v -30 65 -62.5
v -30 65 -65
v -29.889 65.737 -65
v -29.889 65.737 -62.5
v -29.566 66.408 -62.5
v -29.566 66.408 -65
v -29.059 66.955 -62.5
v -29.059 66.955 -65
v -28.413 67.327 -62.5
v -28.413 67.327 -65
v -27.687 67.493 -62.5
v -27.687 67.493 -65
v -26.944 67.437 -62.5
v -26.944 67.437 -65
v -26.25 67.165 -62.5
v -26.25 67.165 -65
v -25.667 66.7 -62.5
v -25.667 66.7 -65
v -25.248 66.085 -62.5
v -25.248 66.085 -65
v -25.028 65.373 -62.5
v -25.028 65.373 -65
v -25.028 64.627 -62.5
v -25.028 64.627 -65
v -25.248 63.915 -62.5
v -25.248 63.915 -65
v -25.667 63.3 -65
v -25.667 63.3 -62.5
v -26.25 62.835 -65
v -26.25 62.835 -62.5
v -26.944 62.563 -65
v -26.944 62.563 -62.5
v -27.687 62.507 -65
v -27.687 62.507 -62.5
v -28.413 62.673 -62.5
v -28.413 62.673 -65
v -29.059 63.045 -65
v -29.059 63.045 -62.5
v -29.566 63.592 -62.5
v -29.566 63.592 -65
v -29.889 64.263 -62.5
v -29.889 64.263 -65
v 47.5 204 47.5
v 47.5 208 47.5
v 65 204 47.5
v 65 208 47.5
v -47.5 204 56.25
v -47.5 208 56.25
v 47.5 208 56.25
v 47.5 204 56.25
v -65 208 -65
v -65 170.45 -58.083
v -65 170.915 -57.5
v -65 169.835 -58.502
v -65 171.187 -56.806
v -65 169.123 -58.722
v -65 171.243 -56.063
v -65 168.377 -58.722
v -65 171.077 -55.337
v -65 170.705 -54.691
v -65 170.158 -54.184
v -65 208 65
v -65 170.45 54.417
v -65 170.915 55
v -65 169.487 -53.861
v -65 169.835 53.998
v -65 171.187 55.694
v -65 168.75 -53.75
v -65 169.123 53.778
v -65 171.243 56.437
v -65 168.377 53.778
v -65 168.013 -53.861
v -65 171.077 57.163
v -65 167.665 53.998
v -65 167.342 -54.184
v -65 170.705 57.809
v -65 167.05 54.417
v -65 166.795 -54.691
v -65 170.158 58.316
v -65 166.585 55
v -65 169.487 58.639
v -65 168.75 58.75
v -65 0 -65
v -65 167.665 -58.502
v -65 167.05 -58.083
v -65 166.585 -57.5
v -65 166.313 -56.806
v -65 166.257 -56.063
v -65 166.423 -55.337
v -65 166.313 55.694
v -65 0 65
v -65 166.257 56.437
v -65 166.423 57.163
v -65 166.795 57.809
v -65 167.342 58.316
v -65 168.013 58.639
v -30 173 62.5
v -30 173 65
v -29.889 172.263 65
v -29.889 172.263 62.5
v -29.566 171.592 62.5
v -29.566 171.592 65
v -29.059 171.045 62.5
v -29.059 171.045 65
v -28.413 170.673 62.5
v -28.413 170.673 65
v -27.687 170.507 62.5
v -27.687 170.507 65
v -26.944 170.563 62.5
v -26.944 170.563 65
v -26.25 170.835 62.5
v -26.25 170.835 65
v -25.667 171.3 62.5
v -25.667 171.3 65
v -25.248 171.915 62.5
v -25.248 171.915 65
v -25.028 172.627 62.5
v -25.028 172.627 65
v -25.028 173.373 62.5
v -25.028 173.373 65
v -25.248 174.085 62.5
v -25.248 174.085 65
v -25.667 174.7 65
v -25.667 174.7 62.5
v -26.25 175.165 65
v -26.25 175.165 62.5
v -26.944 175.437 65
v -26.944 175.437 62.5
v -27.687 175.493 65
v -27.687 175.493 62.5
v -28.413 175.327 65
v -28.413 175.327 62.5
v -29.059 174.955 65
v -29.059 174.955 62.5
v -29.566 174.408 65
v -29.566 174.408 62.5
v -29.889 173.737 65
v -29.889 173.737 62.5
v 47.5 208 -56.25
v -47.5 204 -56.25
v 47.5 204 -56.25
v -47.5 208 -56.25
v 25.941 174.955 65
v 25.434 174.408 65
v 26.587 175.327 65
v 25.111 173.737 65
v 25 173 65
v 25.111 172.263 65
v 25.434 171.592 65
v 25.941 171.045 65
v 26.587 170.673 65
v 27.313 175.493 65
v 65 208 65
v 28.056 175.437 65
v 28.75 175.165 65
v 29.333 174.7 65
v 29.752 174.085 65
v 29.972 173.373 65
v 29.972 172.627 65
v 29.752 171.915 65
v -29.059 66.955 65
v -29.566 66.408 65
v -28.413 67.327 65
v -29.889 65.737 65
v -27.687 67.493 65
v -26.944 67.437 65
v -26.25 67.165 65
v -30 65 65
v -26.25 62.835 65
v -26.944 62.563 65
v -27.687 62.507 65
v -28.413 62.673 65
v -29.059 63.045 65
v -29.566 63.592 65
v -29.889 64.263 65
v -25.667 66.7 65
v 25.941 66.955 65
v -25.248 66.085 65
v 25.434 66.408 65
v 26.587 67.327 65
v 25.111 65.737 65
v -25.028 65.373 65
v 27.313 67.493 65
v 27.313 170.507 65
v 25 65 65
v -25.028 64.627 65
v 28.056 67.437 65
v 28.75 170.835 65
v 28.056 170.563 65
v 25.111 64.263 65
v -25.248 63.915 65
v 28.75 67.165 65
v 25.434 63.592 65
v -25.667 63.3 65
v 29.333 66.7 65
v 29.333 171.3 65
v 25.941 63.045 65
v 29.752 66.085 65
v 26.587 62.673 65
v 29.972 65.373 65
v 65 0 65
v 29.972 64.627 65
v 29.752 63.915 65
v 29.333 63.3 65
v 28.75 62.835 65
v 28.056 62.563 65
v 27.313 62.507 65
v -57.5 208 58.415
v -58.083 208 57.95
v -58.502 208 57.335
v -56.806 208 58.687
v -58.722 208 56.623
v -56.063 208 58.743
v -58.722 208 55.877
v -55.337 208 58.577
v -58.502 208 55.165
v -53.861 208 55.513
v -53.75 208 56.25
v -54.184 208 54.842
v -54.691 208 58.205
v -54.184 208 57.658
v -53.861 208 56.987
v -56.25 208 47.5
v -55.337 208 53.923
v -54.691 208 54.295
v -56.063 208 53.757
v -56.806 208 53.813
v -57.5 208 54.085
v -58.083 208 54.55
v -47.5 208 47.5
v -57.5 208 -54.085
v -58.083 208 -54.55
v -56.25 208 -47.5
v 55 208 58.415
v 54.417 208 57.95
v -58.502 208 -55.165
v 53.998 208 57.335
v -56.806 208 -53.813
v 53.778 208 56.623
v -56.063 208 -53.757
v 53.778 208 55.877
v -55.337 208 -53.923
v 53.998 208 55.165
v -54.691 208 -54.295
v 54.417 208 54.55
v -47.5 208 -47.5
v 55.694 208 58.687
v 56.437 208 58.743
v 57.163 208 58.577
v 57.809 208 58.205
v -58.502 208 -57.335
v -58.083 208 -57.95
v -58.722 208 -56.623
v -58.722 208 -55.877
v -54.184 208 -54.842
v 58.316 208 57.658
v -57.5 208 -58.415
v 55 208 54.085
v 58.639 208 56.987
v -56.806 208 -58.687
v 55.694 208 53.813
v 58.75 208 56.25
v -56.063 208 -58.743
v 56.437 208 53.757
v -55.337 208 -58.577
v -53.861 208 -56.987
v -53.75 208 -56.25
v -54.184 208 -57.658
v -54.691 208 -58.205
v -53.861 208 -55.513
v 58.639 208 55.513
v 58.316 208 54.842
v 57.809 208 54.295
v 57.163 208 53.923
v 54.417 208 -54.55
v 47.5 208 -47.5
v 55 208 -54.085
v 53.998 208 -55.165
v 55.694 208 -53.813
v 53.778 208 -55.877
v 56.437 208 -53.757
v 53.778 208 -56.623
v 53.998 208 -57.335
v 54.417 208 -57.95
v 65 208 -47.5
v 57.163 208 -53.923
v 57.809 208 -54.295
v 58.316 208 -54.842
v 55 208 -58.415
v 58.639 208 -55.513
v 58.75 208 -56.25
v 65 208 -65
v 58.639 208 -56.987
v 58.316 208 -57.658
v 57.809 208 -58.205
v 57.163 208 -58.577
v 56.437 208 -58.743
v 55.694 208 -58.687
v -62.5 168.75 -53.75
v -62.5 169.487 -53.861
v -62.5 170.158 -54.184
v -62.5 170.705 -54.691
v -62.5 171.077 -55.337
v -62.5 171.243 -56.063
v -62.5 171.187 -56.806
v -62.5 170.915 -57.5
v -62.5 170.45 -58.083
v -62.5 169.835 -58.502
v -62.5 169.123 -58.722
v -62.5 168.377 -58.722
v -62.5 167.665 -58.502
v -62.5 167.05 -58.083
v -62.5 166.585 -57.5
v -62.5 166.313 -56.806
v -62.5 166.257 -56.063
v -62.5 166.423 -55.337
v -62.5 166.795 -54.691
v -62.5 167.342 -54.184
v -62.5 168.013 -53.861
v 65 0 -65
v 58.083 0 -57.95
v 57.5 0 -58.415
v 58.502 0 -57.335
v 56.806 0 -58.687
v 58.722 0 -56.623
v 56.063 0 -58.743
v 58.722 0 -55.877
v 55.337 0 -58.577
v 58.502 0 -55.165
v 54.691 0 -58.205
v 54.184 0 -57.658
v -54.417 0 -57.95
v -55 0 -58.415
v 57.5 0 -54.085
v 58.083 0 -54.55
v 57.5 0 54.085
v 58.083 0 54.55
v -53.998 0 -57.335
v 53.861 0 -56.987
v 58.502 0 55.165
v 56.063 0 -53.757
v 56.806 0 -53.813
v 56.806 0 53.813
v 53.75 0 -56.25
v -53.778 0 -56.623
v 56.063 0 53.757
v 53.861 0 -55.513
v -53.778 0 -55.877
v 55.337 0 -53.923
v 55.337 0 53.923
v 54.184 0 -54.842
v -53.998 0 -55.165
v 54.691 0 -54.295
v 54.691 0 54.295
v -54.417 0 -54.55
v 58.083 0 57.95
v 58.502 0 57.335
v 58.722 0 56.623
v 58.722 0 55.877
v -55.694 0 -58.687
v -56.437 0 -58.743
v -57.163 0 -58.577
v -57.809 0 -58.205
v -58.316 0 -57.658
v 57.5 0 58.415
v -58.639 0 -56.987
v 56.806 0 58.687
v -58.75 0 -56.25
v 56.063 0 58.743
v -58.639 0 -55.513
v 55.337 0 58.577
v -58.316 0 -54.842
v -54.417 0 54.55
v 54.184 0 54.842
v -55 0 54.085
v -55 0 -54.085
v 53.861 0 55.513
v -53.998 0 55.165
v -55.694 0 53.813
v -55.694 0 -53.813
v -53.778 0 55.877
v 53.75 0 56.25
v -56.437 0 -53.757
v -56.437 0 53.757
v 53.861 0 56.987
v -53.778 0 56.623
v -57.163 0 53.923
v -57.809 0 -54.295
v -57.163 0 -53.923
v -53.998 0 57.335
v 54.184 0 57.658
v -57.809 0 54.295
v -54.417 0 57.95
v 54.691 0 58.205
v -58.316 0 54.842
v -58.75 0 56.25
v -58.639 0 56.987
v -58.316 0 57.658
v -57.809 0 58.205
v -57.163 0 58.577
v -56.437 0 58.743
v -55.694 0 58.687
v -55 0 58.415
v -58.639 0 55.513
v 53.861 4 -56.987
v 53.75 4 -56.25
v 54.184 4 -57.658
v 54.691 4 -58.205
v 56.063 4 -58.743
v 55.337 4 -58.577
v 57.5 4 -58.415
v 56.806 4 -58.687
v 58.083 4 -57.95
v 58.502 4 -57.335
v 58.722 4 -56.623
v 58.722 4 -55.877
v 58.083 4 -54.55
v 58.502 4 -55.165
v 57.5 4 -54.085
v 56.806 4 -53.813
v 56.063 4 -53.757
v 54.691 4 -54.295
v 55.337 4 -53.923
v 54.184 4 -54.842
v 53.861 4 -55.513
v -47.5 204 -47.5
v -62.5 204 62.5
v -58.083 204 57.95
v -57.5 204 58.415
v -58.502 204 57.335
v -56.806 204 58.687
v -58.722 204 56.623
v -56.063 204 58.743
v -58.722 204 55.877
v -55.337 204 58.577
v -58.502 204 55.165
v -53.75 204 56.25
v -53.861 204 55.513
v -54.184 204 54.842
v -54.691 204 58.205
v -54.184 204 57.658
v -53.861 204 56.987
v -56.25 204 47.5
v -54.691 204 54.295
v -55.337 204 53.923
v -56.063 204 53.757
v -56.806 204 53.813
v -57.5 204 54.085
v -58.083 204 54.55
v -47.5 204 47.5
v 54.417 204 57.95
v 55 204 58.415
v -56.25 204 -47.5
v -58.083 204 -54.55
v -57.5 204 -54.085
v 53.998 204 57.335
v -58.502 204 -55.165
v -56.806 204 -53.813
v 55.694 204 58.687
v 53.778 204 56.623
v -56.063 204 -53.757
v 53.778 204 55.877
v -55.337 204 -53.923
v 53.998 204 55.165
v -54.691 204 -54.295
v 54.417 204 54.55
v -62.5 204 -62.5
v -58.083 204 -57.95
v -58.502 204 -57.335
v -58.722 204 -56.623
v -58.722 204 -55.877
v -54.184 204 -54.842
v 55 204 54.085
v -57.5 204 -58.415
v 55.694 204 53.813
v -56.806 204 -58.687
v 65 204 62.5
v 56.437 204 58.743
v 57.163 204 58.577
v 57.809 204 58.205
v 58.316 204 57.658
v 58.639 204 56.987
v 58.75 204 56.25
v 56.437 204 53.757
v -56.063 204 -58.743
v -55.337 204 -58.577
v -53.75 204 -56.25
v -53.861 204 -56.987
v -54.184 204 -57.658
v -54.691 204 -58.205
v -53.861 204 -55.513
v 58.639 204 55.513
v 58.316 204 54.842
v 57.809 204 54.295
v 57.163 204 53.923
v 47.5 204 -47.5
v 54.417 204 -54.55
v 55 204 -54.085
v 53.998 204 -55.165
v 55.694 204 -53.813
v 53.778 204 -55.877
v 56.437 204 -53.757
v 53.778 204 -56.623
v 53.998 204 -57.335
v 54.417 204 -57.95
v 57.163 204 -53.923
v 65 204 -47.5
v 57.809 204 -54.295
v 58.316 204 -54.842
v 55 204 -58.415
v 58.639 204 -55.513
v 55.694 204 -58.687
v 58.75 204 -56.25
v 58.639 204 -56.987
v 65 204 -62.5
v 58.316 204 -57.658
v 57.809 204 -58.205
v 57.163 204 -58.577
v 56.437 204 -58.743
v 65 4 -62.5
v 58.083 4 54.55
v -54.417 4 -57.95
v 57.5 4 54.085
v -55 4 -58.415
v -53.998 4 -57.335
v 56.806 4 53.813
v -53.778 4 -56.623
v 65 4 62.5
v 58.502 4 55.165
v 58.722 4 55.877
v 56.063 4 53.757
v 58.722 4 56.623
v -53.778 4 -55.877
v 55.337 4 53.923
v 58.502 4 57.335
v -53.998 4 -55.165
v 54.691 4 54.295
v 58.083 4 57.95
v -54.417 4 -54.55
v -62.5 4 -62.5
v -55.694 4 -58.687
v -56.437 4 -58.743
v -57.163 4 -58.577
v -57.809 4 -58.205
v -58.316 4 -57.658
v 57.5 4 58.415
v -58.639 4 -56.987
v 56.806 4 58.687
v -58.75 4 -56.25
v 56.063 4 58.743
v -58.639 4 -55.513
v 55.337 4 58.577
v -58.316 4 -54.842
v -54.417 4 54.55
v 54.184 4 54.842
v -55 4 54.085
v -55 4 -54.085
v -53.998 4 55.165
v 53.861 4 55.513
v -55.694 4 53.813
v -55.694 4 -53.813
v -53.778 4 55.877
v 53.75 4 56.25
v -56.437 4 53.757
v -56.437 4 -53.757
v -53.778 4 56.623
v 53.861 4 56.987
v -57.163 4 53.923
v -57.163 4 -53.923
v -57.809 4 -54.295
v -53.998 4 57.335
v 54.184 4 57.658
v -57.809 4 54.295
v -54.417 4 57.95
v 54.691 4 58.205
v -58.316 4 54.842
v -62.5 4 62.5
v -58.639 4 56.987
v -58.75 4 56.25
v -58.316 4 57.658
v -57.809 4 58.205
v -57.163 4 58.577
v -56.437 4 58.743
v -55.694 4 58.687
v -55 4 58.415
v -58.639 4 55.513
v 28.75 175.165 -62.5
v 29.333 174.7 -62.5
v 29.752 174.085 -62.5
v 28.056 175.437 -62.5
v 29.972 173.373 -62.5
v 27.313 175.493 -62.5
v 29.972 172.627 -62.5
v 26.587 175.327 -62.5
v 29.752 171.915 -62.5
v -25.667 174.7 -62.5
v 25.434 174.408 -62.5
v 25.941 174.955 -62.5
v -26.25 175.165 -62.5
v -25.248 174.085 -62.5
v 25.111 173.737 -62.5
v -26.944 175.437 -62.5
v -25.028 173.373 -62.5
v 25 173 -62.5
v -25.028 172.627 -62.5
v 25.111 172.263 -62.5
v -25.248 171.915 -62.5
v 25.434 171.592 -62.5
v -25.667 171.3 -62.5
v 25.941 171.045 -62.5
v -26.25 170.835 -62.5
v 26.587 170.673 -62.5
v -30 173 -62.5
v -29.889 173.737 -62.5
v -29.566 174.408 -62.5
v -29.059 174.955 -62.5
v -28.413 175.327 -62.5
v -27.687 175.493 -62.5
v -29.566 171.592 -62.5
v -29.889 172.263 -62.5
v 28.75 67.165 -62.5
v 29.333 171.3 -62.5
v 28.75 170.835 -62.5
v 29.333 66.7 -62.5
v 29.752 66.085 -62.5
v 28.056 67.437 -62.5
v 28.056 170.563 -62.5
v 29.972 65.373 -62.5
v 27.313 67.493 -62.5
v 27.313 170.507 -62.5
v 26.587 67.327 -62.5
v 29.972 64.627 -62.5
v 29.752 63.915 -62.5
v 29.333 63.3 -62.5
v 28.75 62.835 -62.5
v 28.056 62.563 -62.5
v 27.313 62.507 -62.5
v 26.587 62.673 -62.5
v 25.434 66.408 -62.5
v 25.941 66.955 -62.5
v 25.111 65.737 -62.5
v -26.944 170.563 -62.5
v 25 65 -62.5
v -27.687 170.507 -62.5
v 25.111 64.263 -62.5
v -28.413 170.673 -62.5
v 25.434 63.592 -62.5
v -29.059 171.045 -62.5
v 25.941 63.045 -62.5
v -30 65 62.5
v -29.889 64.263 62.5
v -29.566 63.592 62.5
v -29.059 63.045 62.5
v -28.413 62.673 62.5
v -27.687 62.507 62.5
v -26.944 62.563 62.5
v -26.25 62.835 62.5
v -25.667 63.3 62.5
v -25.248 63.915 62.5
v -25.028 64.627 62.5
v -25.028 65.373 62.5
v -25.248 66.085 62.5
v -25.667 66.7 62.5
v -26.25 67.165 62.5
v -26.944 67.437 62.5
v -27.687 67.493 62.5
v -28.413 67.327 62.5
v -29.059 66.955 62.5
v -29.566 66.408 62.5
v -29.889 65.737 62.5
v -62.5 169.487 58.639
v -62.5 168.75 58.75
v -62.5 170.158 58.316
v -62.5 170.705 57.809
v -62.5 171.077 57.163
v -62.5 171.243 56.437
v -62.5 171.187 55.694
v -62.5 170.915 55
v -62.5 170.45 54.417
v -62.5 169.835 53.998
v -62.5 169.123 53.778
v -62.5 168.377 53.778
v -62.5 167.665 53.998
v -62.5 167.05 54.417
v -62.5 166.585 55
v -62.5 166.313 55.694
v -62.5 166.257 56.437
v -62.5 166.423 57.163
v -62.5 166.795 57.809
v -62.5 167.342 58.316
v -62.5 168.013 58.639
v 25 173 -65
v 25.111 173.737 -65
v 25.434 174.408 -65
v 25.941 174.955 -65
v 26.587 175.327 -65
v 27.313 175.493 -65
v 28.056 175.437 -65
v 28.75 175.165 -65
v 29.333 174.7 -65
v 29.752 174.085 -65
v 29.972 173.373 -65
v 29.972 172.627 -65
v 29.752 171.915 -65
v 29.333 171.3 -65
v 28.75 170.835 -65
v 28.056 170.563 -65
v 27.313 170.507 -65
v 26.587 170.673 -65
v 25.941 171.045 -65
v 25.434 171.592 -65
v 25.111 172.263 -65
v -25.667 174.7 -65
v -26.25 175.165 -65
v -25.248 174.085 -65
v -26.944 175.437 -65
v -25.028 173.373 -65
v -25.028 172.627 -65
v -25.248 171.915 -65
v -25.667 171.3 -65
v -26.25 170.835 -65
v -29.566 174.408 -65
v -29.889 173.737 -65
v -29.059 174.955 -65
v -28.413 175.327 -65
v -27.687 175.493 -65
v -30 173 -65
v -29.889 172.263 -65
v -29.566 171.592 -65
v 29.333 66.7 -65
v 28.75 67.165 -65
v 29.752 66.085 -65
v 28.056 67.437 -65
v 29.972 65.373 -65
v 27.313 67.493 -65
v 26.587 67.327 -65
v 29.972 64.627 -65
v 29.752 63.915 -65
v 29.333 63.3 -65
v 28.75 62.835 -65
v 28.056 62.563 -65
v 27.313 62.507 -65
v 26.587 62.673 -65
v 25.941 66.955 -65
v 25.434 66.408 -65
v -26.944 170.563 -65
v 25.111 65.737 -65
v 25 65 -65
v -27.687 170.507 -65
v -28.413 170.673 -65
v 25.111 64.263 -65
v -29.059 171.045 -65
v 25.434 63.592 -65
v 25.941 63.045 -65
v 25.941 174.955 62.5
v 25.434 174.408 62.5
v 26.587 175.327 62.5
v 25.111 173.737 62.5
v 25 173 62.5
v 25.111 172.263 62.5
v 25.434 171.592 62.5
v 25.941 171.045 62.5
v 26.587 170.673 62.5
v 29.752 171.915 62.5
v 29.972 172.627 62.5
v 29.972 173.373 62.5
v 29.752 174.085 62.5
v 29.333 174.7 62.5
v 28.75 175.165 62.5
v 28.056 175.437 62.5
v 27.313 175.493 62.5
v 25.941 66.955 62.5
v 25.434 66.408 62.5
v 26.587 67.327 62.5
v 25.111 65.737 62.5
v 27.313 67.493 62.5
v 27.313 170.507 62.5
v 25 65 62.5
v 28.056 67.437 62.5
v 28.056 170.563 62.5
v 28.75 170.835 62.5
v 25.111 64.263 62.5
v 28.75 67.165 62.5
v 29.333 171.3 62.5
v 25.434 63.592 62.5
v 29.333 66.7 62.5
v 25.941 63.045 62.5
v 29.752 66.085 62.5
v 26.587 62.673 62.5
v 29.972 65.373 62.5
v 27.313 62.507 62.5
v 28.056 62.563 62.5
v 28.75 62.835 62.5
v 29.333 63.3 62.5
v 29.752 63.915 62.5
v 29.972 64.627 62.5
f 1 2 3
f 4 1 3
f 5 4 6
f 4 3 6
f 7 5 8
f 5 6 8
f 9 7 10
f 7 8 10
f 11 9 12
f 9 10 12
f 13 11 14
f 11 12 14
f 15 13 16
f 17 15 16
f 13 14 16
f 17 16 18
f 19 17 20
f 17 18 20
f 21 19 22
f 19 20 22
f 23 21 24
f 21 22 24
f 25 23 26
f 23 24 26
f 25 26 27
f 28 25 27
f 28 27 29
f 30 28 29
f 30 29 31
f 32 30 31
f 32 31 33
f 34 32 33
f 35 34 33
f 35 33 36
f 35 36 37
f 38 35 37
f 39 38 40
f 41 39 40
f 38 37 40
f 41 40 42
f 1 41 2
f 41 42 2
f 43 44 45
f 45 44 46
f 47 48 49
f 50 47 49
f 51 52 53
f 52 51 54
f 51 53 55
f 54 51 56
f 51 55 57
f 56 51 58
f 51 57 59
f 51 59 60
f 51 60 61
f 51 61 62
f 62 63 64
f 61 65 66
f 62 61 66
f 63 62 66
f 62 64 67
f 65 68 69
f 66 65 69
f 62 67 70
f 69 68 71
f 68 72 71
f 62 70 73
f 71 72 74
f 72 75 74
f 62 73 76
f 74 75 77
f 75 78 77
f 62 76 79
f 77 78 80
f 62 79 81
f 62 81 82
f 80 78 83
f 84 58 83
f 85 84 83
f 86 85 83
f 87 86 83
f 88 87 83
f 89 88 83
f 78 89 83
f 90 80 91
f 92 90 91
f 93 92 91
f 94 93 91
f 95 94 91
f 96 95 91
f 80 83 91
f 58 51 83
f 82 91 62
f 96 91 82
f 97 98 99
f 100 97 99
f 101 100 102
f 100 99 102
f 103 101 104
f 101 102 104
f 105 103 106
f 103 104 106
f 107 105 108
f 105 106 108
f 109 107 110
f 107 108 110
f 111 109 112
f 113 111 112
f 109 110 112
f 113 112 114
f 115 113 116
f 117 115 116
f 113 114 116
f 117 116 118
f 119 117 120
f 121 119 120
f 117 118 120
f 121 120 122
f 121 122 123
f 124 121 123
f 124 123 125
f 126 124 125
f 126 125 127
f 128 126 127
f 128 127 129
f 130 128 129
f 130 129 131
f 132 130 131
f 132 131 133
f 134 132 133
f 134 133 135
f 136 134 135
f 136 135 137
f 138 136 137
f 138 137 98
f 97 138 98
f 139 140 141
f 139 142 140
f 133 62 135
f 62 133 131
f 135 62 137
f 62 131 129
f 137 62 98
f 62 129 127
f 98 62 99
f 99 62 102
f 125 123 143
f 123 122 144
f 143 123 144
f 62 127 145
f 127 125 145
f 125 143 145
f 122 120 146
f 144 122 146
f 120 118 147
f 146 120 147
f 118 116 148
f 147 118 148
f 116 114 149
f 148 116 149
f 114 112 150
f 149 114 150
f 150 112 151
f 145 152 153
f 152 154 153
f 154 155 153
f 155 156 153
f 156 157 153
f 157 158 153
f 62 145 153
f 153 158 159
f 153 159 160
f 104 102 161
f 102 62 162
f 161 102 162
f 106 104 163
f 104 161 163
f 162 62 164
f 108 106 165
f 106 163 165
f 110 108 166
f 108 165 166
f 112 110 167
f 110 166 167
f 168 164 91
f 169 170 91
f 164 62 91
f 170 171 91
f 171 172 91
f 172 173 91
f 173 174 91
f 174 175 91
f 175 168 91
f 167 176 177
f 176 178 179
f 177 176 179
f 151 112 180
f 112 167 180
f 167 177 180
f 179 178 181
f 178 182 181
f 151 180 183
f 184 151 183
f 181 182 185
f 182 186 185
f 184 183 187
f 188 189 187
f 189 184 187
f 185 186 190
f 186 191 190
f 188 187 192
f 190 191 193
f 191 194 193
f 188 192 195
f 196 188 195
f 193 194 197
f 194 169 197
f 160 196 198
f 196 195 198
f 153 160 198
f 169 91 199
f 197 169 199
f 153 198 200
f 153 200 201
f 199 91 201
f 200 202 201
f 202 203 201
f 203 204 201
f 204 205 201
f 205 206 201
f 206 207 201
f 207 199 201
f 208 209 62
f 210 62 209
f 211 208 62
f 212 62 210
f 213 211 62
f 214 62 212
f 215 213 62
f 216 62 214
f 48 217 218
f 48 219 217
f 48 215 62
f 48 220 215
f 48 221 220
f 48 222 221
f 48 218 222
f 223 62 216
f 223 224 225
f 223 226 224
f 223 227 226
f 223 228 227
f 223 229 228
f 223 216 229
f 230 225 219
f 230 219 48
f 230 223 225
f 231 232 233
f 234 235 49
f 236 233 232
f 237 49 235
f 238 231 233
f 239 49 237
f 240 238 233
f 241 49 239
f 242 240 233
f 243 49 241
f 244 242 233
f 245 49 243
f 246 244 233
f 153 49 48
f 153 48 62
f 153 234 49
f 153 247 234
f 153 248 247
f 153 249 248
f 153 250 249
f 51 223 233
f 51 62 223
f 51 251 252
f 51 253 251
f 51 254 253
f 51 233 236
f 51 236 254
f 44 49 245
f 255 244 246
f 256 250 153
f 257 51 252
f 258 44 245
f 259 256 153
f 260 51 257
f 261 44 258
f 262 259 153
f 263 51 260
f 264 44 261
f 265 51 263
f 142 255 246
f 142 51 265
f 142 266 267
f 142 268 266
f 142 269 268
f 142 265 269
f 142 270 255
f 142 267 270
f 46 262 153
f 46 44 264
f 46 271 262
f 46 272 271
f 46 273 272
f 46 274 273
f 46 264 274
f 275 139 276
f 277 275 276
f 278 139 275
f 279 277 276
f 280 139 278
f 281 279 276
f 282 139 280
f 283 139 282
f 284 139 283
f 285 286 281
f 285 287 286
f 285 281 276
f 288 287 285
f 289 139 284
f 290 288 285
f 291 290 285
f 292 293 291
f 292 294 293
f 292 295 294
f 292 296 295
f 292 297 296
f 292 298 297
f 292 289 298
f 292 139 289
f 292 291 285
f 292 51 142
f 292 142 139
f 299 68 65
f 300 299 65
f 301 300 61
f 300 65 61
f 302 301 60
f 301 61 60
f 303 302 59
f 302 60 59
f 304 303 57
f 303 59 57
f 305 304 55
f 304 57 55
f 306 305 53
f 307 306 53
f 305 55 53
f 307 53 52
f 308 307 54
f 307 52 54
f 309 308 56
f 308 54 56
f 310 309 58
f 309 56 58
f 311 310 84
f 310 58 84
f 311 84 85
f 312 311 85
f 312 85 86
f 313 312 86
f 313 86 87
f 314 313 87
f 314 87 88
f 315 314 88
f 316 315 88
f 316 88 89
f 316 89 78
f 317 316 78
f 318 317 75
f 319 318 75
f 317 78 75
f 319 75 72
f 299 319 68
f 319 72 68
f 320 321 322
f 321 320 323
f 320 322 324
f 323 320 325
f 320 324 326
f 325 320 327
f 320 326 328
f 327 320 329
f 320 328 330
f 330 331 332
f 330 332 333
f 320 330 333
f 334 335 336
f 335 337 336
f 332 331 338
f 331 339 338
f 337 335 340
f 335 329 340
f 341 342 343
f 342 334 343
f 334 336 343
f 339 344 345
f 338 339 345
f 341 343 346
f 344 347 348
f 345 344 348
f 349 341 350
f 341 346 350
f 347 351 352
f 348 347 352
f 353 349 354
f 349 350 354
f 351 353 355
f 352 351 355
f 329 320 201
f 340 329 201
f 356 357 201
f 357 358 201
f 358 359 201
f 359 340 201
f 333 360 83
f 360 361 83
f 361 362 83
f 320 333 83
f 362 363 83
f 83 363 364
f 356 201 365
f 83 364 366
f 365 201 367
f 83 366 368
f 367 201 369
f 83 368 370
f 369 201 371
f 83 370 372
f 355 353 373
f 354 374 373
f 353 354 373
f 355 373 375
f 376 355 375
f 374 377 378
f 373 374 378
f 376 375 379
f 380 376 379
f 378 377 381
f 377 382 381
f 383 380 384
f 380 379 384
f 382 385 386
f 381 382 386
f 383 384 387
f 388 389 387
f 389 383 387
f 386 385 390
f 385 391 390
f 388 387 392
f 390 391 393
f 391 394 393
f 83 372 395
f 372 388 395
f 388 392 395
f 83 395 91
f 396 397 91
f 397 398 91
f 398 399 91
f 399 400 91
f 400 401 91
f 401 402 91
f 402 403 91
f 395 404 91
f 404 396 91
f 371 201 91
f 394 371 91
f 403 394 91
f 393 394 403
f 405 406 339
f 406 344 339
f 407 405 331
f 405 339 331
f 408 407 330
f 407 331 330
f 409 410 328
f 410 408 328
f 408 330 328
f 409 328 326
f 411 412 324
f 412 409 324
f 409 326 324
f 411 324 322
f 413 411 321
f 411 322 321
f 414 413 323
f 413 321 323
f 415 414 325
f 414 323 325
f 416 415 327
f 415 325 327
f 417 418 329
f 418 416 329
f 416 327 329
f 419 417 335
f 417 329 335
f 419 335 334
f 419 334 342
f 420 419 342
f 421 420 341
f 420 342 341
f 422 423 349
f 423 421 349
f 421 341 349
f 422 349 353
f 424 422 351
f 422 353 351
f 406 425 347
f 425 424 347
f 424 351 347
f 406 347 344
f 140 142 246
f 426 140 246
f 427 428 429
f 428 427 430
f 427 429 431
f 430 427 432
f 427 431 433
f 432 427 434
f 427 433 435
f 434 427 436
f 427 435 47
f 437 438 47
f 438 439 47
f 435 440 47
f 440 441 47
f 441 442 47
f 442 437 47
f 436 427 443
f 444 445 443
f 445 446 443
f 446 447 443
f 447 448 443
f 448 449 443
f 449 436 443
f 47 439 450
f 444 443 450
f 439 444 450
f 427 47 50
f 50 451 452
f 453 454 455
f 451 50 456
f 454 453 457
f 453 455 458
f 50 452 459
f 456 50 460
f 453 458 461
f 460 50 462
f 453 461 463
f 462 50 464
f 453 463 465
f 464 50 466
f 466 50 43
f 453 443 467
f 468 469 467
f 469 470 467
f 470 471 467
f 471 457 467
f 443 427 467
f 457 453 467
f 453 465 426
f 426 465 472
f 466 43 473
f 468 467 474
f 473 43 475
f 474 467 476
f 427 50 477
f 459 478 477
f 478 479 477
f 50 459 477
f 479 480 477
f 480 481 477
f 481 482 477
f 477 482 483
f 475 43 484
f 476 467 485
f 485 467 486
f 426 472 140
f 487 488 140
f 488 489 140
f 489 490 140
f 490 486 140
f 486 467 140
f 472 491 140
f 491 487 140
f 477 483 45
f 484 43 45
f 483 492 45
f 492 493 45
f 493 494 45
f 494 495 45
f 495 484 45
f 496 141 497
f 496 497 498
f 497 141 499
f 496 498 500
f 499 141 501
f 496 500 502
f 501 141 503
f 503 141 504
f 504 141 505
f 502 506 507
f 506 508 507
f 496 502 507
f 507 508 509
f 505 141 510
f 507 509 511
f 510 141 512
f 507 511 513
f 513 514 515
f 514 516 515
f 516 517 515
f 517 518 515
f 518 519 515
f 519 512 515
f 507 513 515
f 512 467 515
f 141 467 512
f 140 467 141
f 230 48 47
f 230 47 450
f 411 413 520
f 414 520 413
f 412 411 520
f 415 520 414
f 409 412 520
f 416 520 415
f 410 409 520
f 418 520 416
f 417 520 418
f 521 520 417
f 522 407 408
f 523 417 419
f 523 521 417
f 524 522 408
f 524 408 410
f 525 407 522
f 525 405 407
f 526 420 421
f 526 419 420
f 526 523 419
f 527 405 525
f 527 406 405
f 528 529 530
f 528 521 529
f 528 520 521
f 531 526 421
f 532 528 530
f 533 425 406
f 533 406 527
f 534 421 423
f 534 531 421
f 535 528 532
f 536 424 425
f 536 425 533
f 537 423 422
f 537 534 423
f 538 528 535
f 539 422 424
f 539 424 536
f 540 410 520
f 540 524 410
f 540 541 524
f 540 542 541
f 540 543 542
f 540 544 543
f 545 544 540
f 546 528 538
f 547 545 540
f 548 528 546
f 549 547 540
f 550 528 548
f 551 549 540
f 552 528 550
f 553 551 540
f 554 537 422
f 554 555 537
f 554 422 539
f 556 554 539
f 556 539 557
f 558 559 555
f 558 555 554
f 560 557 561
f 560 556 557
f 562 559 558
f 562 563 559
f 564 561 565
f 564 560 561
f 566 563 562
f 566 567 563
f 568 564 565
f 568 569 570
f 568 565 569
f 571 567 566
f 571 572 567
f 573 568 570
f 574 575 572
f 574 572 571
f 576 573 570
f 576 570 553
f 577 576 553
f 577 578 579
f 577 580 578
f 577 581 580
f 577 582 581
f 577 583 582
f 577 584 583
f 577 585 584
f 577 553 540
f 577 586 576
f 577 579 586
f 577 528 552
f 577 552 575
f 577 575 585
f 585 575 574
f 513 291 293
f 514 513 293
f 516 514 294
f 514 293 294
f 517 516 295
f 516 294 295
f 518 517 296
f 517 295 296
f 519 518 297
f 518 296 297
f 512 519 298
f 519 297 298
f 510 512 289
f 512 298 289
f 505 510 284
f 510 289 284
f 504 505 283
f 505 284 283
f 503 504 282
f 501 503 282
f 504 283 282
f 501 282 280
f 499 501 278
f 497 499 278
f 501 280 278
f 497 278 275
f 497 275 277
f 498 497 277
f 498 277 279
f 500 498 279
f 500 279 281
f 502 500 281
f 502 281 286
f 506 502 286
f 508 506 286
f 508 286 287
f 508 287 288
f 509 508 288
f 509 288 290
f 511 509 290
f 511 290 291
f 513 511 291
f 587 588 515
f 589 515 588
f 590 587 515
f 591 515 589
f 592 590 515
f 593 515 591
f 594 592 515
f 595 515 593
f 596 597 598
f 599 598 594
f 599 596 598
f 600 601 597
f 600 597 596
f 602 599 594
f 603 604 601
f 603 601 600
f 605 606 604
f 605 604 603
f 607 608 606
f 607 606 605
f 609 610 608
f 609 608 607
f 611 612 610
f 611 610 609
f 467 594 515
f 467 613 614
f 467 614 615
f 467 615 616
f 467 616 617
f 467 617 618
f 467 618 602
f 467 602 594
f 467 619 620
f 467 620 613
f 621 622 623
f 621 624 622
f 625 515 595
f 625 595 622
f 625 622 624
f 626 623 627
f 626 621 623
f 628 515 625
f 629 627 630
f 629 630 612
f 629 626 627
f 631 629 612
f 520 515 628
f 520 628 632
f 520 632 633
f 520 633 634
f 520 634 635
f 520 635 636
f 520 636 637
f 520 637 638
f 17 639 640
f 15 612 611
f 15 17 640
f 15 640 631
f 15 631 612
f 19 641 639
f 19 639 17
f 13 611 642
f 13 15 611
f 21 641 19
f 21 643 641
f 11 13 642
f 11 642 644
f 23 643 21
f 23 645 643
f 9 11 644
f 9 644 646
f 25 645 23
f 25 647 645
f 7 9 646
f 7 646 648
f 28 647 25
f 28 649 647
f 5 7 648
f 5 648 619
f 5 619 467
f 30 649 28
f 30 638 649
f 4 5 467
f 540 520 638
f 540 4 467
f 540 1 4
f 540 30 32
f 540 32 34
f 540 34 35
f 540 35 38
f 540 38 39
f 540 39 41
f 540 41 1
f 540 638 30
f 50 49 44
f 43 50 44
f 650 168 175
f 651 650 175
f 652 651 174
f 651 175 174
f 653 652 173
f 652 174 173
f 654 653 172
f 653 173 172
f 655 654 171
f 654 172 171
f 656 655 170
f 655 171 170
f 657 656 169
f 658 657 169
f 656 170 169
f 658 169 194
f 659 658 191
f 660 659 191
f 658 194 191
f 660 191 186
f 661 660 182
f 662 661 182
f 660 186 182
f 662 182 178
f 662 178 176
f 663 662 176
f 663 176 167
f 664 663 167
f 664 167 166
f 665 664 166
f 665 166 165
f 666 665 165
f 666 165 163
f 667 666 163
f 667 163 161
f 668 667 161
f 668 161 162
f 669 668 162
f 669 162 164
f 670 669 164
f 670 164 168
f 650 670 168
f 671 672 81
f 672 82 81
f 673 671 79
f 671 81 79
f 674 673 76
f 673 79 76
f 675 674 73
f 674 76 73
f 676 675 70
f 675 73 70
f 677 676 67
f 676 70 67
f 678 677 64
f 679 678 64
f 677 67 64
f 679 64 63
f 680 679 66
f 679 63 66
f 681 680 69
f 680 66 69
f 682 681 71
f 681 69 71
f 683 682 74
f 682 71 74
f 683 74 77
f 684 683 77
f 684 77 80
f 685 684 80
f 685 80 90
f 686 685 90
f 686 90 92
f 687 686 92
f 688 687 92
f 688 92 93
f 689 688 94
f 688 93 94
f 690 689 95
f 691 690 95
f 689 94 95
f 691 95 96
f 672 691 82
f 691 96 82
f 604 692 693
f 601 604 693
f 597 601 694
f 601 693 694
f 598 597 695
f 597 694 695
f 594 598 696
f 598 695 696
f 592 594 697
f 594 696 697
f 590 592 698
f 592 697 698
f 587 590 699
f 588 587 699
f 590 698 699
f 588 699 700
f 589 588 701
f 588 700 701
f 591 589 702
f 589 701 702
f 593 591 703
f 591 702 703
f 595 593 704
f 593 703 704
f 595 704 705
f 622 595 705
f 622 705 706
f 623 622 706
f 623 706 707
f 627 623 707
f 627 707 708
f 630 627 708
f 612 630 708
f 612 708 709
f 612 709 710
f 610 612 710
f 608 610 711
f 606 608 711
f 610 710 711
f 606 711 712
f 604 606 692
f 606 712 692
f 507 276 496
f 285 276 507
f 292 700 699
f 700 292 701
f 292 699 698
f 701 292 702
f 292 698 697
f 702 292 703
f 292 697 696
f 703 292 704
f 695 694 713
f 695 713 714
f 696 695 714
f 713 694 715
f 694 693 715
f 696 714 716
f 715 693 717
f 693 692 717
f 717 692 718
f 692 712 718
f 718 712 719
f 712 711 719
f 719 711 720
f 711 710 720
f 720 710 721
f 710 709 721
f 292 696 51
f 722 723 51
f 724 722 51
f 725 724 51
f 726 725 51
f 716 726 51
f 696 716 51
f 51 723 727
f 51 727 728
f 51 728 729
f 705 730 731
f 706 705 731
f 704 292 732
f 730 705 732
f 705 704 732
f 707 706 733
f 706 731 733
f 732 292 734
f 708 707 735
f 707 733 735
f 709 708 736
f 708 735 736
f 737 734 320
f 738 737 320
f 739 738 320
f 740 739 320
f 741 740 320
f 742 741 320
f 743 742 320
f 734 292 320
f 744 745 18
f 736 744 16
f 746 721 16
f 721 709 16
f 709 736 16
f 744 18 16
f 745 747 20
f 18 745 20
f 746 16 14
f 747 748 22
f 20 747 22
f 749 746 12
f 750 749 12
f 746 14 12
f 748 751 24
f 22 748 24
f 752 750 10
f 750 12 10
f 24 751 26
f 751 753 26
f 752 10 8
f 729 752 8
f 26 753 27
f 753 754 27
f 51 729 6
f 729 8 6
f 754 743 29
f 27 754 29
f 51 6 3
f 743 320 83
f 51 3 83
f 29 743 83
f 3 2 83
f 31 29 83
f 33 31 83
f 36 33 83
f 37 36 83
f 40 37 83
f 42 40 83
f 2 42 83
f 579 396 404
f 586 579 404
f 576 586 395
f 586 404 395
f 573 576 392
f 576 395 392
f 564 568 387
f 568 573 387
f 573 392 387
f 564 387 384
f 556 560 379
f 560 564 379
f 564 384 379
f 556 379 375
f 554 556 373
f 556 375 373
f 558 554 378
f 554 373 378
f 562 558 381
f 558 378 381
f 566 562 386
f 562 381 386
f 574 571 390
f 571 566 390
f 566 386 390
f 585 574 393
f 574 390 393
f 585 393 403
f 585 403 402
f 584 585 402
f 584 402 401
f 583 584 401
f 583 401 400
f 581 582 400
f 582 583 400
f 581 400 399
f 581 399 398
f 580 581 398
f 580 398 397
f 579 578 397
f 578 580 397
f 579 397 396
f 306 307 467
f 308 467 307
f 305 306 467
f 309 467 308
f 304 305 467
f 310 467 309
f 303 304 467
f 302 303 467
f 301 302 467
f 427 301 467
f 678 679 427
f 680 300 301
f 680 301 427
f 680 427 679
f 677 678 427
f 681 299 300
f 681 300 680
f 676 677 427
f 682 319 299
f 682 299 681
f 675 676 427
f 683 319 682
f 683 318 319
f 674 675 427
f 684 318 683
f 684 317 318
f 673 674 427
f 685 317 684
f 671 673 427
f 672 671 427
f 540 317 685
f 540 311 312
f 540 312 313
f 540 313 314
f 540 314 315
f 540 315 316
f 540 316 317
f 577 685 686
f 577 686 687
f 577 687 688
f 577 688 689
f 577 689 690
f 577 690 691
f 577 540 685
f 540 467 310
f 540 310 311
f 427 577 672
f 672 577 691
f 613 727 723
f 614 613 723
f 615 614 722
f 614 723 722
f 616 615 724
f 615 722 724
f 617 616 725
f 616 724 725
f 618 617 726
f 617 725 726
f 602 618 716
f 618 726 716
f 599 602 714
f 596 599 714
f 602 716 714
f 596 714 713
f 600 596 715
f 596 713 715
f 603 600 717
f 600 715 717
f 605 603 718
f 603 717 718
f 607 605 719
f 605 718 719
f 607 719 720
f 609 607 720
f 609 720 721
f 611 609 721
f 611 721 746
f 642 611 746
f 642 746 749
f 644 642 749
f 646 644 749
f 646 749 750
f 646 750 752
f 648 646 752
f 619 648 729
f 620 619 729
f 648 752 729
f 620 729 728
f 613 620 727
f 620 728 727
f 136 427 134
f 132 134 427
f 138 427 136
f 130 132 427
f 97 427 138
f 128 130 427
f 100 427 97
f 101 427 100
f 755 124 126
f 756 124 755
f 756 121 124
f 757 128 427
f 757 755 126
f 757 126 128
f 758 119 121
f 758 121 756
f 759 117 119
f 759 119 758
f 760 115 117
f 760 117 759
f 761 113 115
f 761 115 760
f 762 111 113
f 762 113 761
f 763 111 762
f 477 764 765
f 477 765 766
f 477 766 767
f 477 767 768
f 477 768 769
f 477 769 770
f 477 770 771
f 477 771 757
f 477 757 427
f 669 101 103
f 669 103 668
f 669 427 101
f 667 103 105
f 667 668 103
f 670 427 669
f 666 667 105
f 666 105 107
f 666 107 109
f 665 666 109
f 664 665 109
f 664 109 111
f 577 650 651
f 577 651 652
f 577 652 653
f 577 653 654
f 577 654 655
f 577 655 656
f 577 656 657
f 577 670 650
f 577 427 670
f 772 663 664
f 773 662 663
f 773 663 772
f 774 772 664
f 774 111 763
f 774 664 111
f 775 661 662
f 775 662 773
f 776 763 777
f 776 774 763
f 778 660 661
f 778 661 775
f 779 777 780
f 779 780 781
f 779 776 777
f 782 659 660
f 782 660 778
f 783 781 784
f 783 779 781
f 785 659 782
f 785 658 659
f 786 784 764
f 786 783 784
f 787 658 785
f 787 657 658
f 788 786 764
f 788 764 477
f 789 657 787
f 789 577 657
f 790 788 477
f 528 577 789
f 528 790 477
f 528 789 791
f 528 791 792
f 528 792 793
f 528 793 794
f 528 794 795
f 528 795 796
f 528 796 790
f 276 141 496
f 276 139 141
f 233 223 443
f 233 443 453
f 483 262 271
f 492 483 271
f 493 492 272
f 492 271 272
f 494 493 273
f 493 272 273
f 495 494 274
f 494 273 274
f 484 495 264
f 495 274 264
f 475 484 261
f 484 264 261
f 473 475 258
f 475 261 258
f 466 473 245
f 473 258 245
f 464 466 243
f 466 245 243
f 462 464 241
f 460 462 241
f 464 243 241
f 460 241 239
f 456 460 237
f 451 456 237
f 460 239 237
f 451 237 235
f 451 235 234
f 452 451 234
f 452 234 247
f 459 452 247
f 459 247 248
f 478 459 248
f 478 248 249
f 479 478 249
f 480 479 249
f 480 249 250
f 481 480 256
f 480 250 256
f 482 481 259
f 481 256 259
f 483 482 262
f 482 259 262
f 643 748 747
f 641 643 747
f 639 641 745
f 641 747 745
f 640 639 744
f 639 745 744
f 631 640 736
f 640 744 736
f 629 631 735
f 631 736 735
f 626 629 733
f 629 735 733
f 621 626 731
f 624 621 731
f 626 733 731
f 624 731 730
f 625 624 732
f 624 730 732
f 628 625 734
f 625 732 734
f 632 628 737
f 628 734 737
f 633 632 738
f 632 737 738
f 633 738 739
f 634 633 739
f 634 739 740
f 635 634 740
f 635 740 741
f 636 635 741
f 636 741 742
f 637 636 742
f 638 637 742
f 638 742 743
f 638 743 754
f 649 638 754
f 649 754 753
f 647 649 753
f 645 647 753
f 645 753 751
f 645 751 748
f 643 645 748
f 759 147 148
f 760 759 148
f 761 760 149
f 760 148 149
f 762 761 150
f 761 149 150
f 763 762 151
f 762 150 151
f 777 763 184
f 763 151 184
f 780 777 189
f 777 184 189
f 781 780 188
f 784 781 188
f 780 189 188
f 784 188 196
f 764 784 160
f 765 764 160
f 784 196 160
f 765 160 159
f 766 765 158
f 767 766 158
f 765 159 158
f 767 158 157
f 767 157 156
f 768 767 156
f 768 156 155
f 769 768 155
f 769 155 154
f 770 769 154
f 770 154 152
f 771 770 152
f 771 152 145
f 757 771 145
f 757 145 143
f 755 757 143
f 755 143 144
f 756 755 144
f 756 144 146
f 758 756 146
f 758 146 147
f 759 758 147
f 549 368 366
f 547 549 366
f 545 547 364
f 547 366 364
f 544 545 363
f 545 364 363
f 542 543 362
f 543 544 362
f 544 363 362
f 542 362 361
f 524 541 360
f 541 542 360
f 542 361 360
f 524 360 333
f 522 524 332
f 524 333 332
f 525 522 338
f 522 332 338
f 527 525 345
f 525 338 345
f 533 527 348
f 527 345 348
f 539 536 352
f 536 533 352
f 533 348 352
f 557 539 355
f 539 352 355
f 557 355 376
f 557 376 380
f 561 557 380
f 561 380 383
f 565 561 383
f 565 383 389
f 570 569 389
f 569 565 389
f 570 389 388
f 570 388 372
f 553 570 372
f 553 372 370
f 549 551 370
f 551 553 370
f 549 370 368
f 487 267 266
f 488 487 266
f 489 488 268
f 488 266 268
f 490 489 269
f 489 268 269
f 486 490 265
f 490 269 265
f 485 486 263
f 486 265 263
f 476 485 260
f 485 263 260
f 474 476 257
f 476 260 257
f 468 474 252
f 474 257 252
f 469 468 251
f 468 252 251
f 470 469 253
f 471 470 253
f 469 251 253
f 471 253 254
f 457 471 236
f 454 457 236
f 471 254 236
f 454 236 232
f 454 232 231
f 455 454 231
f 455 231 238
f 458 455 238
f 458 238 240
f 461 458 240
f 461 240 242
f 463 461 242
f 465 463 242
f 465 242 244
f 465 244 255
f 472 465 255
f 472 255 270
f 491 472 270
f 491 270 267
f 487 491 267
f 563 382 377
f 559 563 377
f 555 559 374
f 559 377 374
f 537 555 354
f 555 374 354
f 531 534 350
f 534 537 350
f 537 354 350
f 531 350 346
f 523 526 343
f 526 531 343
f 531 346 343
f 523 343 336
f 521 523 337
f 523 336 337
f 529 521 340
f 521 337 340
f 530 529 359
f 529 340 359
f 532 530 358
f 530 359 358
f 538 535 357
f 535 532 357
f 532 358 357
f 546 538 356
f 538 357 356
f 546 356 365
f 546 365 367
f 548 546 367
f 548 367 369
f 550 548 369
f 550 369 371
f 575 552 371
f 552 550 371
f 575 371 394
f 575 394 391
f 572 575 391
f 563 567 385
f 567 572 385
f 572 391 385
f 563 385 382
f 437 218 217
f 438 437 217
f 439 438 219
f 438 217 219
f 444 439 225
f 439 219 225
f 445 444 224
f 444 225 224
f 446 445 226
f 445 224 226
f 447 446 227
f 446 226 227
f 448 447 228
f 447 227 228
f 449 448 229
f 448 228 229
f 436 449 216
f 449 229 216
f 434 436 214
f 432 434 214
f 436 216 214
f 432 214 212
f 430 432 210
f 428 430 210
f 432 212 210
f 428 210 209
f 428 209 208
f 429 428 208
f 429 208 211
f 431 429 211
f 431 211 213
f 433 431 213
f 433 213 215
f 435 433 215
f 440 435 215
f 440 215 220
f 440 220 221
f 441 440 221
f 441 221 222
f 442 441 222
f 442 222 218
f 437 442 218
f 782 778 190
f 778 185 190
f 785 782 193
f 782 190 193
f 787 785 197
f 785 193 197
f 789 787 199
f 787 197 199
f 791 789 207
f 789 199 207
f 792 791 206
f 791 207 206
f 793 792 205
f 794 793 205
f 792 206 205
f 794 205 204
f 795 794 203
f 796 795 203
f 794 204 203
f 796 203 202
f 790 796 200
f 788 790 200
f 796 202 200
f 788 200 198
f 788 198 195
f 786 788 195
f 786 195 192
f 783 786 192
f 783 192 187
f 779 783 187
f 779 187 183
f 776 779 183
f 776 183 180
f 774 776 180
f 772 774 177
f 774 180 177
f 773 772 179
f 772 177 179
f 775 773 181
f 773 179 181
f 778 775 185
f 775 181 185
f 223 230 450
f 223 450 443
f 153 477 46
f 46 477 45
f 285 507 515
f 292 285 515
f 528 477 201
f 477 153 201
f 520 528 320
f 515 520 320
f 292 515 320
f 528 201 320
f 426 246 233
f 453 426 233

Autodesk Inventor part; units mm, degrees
ref_plane "YZ Plane" through (0, 0, 0) normal (1, 0, 0) x (0, 1, 0)
ref_plane "XZ Plane" through (0, 0, 0) normal (0, 1, 0) x (-1, 0, 0)
ref_plane "XY Plane" through (0, 0, 0) normal (0, 0, 1) x (1, 0, 0)
sketch "Sketch1" plane through (0, 0, 0) normal (0, 1, 0) x (-1, 0, 0)
  line L0 (65, 65) -> (-65, 65)
  line L1 (-65, 65) -> (-65, -65)
  line L2 (-65, -65) -> (65, -65)
  line L3 (65, -65) -> (65, 65)
  line L4 (65, 65) -> (-65, -65) construction
  line L5 (-65, 65) -> (65, -65) construction
  circle A0 centre (-56.25, 56.25) radius 2.5
  line L6 (0, 15.2849) -> (0, -21.0051)
  line L7 (0, -21.0051) -> (-20.003, 0)
  line L8 (-20.003, 0) -> (15.941, 0)
  circle A1 centre (56.25, 56.25) radius 2.5
  circle A2 centre (-56.25, -56.25) radius 2.5
  circle A3 centre (56.25, -56.25) radius 2.5
  point P0 (0, 0)
  point P1 (0, 0)
  dimension "d0" = 130
  dimension "d1" = 130
  dimension "d2" = 5
  dimension "d3" = 8.75
extrude "Extrusion1" add sketch "Sketch1" along normal blind 4 contours L3 L2 L1 L0 | L6 L7 L8
sketch "Sketch2" plane through (0, 4, 0) normal (0, 1, 0) x (1, 0, 0)
  line L0 (-62.5, -62.5) -> (62.5, -62.5)
  line L1 (62.5, -62.5) -> (62.5, 62.5)
  line L2 (62.5, 62.5) -> (-62.5, 62.5)
  line L3 (-62.5, 62.5) -> (-62.5, -62.5)
  line L4 (-62.5, -62.5) -> (62.5, 62.5) construction
  line L5 (62.5, -62.5) -> (-62.5, 62.5) construction
  line L6 (-65, 65) -> (-65, -65) projected
  line L7 (65, 65) -> (-65, 65) projected
  line L8 (-65, -65) -> (65, -65)
  line L9 (65, -65) -> (65, 65)
  line L10 (65, 65) -> (-65, 65)
  line L11 (-65, 65) -> (-65, -65)
  line L12 (-65, -65) -> (65, 65) construction
  line L13 (65, -65) -> (-65, 65) construction
  line L14 (62.5, -62.5) -> (65, -62.5)
  line L15 (62.5, 62.5) -> (65, 62.5)
  point P0 (0, 0)
  dimension "d6" = 2.5
  dimension "d7" = 2.5
extrude "Extrusion2" add sketch "Sketch2" along normal blind 204 contours L0 L14 L9 L8 L6 L7 L15 L2 L3
sketch "Sketch3" plane through (0, 208, 0) normal (0, 1, 0) x (1, 0, 0)
  line L0 (-65, 65) -> (-65, -65) projected
  line L1 (-65, -65) -> (-47.5, -65)
  line L2 (-47.5, -65) -> (-47.5, -47.5)
  line L3 (-47.5, -47.5) -> (-65, -47.5)
  line L4 (-65, -47.5) -> (-65, -65)
  line L5 (-65, 65) -> (-47.5, 65)
  line L6 (-47.5, 65) -> (-47.5, 47.5)
  line L7 (-47.5, 47.5) -> (-65, 47.5)
  line L8 (-65, 47.5) -> (-65, 65)
  line L9 (-65, -65) -> (65, -65) projected
  line L10 (65, -65) -> (47.5, -65)
  line L11 (47.5, -65) -> (47.5, -47.5)
  line L12 (47.5, -47.5) -> (65, -47.5)
  line L13 (65, -47.5) -> (65, -65)
  line L14 (65, 65) -> (-65, 65) projected
  line L15 (65, 65) -> (47.5, 65)
  line L16 (47.5, 65) -> (47.5, 47.5)
  line L17 (47.5, 47.5) -> (65, 47.5)
  line L18 (65, 47.5) -> (65, 65)
  circle A0 centre (56.25, -56.25) radius 2.5
  circle A1 centre (56.25, 56.25) radius 2.5 projected
  circle A2 centre (56.25, 56.25) radius 2.5
  circle A3 centre (-56.25, 56.25) radius 2.5
  circle A4 centre (-56.25, -56.25) radius 2.5 projected
  circle A5 centre (-56.25, -56.25) radius 2.5
  line L19 (-47.5, -56.25) -> (47.5, -56.25)
  line L20 (-56.25, -47.5) -> (-56.25, 47.5)
  line L21 (-47.5, 56.25) -> (47.5, 56.25)
  point P0 (0, 0)
  point P1 (56.25, -65)
  dimension "d10" = 17.5
  dimension "d11" = 17.5
  dimension "d12" = 17.5
  dimension "d13" = 17.5
  dimension "d14" = 17.5
  dimension "d15" = 17.5
  dimension "d16" = 17.5
  dimension "d17" = 17.5
  dimension "d18" = 5
  dimension "d19" = 5
  dimension "d20" = 5
  dimension "d21" = 5
extrude "Extrusion3" add sketch "Sketch3" against normal blind 4
sketch "Sketch4" plane through (-65, 0, -65) normal (-1, 0, 0) x (0, 0, 1)
  circle A0 centre (8.75, 168.75) radius 2.5
  circle A1 centre (121.25, 168.75) radius 2.5
  line L0 (0, 208) -> (130, 208) projected
  line L1 (0, 0) -> (0, 208) projected
  line L2 (130, 0) -> (130, 208) projected
  point P0 (65, 0)
  dimension "d24" = 5
  dimension "d25" = 5
  dimension "d26" = 39.25
  dimension "d27" = 39.25
  dimension "d28" = 8.75
  dimension "d29" = 8.75
extrude "Extrusion4" cut sketch "Sketch4" against normal through all
sketch "Sketch7" plane through (-65, 0, 65) normal (0, 0, 1) x (1, 0, 0)
  circle A0 centre (37.5, 173) radius 2.5
  circle A1 centre (92.5, 173) radius 2.5
  circle A2 centre (37.5, 65) radius 2.5
  circle A3 centre (92.5, 65) radius 2.5
  line L0 (0, 208) -> (130, 208) projected
  line L1 (130, 0) -> (130, 208) projected
  line L2 (0, 0) -> (130, 0) projected
  point P0 (65, 0)
  dimension "d47" = 5
  dimension "d48" = 5
  dimension "d49" = 5
  dimension "d50" = 5
  dimension "d51" = 55
  dimension "d52" = 55
  dimension "d53" = 0
  dimension "d54" = 35
  dimension "d55" = 0
  dimension "d56" = 37.5
  dimension "d57" = 37.5
  dimension "d58" = 65
sketch "Sketch5" plane through (65, 0, -65) normal (0, 0, -1) x (-1, 0, 0)
  circle A0 centre (37.5, 173) radius 2.5
  circle A1 centre (92.5, 173) radius 2.5
  circle A2 centre (37.5, 65) radius 2.5
  circle A3 centre (92.5, 65) radius 2.5
  line L0 (130, 0) -> (130, 208) projected
  line L1 (0, 208) -> (130, 208) projected
  line L2 (0, 0) -> (130, 0) projected
  point P0 (65, 0)
  dimension "d32" = 5
  dimension "d33" = 5
  dimension "d34" = 5
  dimension "d35" = 5
  dimension "d36" = 55
  dimension "d37" = 55
  dimension "d38" = 0
  dimension "d39" = 37.5
  dimension "d40" = 37.5
  dimension "d41" = 35
  dimension "d42" = 65
  dimension "d43" = 35
extrude "Extrusion5" cut sketch "Sketch5" against normal blind 10
sketch "Sketch6" plane through (65, 0, -65) normal (0, 0, -1) x (-1, 0, 0)
  point P0 (65, 0)
mirror "Mirror1" about plane through (0, 0, 0) normal (0, 0, 1) of "Extrusion5"
